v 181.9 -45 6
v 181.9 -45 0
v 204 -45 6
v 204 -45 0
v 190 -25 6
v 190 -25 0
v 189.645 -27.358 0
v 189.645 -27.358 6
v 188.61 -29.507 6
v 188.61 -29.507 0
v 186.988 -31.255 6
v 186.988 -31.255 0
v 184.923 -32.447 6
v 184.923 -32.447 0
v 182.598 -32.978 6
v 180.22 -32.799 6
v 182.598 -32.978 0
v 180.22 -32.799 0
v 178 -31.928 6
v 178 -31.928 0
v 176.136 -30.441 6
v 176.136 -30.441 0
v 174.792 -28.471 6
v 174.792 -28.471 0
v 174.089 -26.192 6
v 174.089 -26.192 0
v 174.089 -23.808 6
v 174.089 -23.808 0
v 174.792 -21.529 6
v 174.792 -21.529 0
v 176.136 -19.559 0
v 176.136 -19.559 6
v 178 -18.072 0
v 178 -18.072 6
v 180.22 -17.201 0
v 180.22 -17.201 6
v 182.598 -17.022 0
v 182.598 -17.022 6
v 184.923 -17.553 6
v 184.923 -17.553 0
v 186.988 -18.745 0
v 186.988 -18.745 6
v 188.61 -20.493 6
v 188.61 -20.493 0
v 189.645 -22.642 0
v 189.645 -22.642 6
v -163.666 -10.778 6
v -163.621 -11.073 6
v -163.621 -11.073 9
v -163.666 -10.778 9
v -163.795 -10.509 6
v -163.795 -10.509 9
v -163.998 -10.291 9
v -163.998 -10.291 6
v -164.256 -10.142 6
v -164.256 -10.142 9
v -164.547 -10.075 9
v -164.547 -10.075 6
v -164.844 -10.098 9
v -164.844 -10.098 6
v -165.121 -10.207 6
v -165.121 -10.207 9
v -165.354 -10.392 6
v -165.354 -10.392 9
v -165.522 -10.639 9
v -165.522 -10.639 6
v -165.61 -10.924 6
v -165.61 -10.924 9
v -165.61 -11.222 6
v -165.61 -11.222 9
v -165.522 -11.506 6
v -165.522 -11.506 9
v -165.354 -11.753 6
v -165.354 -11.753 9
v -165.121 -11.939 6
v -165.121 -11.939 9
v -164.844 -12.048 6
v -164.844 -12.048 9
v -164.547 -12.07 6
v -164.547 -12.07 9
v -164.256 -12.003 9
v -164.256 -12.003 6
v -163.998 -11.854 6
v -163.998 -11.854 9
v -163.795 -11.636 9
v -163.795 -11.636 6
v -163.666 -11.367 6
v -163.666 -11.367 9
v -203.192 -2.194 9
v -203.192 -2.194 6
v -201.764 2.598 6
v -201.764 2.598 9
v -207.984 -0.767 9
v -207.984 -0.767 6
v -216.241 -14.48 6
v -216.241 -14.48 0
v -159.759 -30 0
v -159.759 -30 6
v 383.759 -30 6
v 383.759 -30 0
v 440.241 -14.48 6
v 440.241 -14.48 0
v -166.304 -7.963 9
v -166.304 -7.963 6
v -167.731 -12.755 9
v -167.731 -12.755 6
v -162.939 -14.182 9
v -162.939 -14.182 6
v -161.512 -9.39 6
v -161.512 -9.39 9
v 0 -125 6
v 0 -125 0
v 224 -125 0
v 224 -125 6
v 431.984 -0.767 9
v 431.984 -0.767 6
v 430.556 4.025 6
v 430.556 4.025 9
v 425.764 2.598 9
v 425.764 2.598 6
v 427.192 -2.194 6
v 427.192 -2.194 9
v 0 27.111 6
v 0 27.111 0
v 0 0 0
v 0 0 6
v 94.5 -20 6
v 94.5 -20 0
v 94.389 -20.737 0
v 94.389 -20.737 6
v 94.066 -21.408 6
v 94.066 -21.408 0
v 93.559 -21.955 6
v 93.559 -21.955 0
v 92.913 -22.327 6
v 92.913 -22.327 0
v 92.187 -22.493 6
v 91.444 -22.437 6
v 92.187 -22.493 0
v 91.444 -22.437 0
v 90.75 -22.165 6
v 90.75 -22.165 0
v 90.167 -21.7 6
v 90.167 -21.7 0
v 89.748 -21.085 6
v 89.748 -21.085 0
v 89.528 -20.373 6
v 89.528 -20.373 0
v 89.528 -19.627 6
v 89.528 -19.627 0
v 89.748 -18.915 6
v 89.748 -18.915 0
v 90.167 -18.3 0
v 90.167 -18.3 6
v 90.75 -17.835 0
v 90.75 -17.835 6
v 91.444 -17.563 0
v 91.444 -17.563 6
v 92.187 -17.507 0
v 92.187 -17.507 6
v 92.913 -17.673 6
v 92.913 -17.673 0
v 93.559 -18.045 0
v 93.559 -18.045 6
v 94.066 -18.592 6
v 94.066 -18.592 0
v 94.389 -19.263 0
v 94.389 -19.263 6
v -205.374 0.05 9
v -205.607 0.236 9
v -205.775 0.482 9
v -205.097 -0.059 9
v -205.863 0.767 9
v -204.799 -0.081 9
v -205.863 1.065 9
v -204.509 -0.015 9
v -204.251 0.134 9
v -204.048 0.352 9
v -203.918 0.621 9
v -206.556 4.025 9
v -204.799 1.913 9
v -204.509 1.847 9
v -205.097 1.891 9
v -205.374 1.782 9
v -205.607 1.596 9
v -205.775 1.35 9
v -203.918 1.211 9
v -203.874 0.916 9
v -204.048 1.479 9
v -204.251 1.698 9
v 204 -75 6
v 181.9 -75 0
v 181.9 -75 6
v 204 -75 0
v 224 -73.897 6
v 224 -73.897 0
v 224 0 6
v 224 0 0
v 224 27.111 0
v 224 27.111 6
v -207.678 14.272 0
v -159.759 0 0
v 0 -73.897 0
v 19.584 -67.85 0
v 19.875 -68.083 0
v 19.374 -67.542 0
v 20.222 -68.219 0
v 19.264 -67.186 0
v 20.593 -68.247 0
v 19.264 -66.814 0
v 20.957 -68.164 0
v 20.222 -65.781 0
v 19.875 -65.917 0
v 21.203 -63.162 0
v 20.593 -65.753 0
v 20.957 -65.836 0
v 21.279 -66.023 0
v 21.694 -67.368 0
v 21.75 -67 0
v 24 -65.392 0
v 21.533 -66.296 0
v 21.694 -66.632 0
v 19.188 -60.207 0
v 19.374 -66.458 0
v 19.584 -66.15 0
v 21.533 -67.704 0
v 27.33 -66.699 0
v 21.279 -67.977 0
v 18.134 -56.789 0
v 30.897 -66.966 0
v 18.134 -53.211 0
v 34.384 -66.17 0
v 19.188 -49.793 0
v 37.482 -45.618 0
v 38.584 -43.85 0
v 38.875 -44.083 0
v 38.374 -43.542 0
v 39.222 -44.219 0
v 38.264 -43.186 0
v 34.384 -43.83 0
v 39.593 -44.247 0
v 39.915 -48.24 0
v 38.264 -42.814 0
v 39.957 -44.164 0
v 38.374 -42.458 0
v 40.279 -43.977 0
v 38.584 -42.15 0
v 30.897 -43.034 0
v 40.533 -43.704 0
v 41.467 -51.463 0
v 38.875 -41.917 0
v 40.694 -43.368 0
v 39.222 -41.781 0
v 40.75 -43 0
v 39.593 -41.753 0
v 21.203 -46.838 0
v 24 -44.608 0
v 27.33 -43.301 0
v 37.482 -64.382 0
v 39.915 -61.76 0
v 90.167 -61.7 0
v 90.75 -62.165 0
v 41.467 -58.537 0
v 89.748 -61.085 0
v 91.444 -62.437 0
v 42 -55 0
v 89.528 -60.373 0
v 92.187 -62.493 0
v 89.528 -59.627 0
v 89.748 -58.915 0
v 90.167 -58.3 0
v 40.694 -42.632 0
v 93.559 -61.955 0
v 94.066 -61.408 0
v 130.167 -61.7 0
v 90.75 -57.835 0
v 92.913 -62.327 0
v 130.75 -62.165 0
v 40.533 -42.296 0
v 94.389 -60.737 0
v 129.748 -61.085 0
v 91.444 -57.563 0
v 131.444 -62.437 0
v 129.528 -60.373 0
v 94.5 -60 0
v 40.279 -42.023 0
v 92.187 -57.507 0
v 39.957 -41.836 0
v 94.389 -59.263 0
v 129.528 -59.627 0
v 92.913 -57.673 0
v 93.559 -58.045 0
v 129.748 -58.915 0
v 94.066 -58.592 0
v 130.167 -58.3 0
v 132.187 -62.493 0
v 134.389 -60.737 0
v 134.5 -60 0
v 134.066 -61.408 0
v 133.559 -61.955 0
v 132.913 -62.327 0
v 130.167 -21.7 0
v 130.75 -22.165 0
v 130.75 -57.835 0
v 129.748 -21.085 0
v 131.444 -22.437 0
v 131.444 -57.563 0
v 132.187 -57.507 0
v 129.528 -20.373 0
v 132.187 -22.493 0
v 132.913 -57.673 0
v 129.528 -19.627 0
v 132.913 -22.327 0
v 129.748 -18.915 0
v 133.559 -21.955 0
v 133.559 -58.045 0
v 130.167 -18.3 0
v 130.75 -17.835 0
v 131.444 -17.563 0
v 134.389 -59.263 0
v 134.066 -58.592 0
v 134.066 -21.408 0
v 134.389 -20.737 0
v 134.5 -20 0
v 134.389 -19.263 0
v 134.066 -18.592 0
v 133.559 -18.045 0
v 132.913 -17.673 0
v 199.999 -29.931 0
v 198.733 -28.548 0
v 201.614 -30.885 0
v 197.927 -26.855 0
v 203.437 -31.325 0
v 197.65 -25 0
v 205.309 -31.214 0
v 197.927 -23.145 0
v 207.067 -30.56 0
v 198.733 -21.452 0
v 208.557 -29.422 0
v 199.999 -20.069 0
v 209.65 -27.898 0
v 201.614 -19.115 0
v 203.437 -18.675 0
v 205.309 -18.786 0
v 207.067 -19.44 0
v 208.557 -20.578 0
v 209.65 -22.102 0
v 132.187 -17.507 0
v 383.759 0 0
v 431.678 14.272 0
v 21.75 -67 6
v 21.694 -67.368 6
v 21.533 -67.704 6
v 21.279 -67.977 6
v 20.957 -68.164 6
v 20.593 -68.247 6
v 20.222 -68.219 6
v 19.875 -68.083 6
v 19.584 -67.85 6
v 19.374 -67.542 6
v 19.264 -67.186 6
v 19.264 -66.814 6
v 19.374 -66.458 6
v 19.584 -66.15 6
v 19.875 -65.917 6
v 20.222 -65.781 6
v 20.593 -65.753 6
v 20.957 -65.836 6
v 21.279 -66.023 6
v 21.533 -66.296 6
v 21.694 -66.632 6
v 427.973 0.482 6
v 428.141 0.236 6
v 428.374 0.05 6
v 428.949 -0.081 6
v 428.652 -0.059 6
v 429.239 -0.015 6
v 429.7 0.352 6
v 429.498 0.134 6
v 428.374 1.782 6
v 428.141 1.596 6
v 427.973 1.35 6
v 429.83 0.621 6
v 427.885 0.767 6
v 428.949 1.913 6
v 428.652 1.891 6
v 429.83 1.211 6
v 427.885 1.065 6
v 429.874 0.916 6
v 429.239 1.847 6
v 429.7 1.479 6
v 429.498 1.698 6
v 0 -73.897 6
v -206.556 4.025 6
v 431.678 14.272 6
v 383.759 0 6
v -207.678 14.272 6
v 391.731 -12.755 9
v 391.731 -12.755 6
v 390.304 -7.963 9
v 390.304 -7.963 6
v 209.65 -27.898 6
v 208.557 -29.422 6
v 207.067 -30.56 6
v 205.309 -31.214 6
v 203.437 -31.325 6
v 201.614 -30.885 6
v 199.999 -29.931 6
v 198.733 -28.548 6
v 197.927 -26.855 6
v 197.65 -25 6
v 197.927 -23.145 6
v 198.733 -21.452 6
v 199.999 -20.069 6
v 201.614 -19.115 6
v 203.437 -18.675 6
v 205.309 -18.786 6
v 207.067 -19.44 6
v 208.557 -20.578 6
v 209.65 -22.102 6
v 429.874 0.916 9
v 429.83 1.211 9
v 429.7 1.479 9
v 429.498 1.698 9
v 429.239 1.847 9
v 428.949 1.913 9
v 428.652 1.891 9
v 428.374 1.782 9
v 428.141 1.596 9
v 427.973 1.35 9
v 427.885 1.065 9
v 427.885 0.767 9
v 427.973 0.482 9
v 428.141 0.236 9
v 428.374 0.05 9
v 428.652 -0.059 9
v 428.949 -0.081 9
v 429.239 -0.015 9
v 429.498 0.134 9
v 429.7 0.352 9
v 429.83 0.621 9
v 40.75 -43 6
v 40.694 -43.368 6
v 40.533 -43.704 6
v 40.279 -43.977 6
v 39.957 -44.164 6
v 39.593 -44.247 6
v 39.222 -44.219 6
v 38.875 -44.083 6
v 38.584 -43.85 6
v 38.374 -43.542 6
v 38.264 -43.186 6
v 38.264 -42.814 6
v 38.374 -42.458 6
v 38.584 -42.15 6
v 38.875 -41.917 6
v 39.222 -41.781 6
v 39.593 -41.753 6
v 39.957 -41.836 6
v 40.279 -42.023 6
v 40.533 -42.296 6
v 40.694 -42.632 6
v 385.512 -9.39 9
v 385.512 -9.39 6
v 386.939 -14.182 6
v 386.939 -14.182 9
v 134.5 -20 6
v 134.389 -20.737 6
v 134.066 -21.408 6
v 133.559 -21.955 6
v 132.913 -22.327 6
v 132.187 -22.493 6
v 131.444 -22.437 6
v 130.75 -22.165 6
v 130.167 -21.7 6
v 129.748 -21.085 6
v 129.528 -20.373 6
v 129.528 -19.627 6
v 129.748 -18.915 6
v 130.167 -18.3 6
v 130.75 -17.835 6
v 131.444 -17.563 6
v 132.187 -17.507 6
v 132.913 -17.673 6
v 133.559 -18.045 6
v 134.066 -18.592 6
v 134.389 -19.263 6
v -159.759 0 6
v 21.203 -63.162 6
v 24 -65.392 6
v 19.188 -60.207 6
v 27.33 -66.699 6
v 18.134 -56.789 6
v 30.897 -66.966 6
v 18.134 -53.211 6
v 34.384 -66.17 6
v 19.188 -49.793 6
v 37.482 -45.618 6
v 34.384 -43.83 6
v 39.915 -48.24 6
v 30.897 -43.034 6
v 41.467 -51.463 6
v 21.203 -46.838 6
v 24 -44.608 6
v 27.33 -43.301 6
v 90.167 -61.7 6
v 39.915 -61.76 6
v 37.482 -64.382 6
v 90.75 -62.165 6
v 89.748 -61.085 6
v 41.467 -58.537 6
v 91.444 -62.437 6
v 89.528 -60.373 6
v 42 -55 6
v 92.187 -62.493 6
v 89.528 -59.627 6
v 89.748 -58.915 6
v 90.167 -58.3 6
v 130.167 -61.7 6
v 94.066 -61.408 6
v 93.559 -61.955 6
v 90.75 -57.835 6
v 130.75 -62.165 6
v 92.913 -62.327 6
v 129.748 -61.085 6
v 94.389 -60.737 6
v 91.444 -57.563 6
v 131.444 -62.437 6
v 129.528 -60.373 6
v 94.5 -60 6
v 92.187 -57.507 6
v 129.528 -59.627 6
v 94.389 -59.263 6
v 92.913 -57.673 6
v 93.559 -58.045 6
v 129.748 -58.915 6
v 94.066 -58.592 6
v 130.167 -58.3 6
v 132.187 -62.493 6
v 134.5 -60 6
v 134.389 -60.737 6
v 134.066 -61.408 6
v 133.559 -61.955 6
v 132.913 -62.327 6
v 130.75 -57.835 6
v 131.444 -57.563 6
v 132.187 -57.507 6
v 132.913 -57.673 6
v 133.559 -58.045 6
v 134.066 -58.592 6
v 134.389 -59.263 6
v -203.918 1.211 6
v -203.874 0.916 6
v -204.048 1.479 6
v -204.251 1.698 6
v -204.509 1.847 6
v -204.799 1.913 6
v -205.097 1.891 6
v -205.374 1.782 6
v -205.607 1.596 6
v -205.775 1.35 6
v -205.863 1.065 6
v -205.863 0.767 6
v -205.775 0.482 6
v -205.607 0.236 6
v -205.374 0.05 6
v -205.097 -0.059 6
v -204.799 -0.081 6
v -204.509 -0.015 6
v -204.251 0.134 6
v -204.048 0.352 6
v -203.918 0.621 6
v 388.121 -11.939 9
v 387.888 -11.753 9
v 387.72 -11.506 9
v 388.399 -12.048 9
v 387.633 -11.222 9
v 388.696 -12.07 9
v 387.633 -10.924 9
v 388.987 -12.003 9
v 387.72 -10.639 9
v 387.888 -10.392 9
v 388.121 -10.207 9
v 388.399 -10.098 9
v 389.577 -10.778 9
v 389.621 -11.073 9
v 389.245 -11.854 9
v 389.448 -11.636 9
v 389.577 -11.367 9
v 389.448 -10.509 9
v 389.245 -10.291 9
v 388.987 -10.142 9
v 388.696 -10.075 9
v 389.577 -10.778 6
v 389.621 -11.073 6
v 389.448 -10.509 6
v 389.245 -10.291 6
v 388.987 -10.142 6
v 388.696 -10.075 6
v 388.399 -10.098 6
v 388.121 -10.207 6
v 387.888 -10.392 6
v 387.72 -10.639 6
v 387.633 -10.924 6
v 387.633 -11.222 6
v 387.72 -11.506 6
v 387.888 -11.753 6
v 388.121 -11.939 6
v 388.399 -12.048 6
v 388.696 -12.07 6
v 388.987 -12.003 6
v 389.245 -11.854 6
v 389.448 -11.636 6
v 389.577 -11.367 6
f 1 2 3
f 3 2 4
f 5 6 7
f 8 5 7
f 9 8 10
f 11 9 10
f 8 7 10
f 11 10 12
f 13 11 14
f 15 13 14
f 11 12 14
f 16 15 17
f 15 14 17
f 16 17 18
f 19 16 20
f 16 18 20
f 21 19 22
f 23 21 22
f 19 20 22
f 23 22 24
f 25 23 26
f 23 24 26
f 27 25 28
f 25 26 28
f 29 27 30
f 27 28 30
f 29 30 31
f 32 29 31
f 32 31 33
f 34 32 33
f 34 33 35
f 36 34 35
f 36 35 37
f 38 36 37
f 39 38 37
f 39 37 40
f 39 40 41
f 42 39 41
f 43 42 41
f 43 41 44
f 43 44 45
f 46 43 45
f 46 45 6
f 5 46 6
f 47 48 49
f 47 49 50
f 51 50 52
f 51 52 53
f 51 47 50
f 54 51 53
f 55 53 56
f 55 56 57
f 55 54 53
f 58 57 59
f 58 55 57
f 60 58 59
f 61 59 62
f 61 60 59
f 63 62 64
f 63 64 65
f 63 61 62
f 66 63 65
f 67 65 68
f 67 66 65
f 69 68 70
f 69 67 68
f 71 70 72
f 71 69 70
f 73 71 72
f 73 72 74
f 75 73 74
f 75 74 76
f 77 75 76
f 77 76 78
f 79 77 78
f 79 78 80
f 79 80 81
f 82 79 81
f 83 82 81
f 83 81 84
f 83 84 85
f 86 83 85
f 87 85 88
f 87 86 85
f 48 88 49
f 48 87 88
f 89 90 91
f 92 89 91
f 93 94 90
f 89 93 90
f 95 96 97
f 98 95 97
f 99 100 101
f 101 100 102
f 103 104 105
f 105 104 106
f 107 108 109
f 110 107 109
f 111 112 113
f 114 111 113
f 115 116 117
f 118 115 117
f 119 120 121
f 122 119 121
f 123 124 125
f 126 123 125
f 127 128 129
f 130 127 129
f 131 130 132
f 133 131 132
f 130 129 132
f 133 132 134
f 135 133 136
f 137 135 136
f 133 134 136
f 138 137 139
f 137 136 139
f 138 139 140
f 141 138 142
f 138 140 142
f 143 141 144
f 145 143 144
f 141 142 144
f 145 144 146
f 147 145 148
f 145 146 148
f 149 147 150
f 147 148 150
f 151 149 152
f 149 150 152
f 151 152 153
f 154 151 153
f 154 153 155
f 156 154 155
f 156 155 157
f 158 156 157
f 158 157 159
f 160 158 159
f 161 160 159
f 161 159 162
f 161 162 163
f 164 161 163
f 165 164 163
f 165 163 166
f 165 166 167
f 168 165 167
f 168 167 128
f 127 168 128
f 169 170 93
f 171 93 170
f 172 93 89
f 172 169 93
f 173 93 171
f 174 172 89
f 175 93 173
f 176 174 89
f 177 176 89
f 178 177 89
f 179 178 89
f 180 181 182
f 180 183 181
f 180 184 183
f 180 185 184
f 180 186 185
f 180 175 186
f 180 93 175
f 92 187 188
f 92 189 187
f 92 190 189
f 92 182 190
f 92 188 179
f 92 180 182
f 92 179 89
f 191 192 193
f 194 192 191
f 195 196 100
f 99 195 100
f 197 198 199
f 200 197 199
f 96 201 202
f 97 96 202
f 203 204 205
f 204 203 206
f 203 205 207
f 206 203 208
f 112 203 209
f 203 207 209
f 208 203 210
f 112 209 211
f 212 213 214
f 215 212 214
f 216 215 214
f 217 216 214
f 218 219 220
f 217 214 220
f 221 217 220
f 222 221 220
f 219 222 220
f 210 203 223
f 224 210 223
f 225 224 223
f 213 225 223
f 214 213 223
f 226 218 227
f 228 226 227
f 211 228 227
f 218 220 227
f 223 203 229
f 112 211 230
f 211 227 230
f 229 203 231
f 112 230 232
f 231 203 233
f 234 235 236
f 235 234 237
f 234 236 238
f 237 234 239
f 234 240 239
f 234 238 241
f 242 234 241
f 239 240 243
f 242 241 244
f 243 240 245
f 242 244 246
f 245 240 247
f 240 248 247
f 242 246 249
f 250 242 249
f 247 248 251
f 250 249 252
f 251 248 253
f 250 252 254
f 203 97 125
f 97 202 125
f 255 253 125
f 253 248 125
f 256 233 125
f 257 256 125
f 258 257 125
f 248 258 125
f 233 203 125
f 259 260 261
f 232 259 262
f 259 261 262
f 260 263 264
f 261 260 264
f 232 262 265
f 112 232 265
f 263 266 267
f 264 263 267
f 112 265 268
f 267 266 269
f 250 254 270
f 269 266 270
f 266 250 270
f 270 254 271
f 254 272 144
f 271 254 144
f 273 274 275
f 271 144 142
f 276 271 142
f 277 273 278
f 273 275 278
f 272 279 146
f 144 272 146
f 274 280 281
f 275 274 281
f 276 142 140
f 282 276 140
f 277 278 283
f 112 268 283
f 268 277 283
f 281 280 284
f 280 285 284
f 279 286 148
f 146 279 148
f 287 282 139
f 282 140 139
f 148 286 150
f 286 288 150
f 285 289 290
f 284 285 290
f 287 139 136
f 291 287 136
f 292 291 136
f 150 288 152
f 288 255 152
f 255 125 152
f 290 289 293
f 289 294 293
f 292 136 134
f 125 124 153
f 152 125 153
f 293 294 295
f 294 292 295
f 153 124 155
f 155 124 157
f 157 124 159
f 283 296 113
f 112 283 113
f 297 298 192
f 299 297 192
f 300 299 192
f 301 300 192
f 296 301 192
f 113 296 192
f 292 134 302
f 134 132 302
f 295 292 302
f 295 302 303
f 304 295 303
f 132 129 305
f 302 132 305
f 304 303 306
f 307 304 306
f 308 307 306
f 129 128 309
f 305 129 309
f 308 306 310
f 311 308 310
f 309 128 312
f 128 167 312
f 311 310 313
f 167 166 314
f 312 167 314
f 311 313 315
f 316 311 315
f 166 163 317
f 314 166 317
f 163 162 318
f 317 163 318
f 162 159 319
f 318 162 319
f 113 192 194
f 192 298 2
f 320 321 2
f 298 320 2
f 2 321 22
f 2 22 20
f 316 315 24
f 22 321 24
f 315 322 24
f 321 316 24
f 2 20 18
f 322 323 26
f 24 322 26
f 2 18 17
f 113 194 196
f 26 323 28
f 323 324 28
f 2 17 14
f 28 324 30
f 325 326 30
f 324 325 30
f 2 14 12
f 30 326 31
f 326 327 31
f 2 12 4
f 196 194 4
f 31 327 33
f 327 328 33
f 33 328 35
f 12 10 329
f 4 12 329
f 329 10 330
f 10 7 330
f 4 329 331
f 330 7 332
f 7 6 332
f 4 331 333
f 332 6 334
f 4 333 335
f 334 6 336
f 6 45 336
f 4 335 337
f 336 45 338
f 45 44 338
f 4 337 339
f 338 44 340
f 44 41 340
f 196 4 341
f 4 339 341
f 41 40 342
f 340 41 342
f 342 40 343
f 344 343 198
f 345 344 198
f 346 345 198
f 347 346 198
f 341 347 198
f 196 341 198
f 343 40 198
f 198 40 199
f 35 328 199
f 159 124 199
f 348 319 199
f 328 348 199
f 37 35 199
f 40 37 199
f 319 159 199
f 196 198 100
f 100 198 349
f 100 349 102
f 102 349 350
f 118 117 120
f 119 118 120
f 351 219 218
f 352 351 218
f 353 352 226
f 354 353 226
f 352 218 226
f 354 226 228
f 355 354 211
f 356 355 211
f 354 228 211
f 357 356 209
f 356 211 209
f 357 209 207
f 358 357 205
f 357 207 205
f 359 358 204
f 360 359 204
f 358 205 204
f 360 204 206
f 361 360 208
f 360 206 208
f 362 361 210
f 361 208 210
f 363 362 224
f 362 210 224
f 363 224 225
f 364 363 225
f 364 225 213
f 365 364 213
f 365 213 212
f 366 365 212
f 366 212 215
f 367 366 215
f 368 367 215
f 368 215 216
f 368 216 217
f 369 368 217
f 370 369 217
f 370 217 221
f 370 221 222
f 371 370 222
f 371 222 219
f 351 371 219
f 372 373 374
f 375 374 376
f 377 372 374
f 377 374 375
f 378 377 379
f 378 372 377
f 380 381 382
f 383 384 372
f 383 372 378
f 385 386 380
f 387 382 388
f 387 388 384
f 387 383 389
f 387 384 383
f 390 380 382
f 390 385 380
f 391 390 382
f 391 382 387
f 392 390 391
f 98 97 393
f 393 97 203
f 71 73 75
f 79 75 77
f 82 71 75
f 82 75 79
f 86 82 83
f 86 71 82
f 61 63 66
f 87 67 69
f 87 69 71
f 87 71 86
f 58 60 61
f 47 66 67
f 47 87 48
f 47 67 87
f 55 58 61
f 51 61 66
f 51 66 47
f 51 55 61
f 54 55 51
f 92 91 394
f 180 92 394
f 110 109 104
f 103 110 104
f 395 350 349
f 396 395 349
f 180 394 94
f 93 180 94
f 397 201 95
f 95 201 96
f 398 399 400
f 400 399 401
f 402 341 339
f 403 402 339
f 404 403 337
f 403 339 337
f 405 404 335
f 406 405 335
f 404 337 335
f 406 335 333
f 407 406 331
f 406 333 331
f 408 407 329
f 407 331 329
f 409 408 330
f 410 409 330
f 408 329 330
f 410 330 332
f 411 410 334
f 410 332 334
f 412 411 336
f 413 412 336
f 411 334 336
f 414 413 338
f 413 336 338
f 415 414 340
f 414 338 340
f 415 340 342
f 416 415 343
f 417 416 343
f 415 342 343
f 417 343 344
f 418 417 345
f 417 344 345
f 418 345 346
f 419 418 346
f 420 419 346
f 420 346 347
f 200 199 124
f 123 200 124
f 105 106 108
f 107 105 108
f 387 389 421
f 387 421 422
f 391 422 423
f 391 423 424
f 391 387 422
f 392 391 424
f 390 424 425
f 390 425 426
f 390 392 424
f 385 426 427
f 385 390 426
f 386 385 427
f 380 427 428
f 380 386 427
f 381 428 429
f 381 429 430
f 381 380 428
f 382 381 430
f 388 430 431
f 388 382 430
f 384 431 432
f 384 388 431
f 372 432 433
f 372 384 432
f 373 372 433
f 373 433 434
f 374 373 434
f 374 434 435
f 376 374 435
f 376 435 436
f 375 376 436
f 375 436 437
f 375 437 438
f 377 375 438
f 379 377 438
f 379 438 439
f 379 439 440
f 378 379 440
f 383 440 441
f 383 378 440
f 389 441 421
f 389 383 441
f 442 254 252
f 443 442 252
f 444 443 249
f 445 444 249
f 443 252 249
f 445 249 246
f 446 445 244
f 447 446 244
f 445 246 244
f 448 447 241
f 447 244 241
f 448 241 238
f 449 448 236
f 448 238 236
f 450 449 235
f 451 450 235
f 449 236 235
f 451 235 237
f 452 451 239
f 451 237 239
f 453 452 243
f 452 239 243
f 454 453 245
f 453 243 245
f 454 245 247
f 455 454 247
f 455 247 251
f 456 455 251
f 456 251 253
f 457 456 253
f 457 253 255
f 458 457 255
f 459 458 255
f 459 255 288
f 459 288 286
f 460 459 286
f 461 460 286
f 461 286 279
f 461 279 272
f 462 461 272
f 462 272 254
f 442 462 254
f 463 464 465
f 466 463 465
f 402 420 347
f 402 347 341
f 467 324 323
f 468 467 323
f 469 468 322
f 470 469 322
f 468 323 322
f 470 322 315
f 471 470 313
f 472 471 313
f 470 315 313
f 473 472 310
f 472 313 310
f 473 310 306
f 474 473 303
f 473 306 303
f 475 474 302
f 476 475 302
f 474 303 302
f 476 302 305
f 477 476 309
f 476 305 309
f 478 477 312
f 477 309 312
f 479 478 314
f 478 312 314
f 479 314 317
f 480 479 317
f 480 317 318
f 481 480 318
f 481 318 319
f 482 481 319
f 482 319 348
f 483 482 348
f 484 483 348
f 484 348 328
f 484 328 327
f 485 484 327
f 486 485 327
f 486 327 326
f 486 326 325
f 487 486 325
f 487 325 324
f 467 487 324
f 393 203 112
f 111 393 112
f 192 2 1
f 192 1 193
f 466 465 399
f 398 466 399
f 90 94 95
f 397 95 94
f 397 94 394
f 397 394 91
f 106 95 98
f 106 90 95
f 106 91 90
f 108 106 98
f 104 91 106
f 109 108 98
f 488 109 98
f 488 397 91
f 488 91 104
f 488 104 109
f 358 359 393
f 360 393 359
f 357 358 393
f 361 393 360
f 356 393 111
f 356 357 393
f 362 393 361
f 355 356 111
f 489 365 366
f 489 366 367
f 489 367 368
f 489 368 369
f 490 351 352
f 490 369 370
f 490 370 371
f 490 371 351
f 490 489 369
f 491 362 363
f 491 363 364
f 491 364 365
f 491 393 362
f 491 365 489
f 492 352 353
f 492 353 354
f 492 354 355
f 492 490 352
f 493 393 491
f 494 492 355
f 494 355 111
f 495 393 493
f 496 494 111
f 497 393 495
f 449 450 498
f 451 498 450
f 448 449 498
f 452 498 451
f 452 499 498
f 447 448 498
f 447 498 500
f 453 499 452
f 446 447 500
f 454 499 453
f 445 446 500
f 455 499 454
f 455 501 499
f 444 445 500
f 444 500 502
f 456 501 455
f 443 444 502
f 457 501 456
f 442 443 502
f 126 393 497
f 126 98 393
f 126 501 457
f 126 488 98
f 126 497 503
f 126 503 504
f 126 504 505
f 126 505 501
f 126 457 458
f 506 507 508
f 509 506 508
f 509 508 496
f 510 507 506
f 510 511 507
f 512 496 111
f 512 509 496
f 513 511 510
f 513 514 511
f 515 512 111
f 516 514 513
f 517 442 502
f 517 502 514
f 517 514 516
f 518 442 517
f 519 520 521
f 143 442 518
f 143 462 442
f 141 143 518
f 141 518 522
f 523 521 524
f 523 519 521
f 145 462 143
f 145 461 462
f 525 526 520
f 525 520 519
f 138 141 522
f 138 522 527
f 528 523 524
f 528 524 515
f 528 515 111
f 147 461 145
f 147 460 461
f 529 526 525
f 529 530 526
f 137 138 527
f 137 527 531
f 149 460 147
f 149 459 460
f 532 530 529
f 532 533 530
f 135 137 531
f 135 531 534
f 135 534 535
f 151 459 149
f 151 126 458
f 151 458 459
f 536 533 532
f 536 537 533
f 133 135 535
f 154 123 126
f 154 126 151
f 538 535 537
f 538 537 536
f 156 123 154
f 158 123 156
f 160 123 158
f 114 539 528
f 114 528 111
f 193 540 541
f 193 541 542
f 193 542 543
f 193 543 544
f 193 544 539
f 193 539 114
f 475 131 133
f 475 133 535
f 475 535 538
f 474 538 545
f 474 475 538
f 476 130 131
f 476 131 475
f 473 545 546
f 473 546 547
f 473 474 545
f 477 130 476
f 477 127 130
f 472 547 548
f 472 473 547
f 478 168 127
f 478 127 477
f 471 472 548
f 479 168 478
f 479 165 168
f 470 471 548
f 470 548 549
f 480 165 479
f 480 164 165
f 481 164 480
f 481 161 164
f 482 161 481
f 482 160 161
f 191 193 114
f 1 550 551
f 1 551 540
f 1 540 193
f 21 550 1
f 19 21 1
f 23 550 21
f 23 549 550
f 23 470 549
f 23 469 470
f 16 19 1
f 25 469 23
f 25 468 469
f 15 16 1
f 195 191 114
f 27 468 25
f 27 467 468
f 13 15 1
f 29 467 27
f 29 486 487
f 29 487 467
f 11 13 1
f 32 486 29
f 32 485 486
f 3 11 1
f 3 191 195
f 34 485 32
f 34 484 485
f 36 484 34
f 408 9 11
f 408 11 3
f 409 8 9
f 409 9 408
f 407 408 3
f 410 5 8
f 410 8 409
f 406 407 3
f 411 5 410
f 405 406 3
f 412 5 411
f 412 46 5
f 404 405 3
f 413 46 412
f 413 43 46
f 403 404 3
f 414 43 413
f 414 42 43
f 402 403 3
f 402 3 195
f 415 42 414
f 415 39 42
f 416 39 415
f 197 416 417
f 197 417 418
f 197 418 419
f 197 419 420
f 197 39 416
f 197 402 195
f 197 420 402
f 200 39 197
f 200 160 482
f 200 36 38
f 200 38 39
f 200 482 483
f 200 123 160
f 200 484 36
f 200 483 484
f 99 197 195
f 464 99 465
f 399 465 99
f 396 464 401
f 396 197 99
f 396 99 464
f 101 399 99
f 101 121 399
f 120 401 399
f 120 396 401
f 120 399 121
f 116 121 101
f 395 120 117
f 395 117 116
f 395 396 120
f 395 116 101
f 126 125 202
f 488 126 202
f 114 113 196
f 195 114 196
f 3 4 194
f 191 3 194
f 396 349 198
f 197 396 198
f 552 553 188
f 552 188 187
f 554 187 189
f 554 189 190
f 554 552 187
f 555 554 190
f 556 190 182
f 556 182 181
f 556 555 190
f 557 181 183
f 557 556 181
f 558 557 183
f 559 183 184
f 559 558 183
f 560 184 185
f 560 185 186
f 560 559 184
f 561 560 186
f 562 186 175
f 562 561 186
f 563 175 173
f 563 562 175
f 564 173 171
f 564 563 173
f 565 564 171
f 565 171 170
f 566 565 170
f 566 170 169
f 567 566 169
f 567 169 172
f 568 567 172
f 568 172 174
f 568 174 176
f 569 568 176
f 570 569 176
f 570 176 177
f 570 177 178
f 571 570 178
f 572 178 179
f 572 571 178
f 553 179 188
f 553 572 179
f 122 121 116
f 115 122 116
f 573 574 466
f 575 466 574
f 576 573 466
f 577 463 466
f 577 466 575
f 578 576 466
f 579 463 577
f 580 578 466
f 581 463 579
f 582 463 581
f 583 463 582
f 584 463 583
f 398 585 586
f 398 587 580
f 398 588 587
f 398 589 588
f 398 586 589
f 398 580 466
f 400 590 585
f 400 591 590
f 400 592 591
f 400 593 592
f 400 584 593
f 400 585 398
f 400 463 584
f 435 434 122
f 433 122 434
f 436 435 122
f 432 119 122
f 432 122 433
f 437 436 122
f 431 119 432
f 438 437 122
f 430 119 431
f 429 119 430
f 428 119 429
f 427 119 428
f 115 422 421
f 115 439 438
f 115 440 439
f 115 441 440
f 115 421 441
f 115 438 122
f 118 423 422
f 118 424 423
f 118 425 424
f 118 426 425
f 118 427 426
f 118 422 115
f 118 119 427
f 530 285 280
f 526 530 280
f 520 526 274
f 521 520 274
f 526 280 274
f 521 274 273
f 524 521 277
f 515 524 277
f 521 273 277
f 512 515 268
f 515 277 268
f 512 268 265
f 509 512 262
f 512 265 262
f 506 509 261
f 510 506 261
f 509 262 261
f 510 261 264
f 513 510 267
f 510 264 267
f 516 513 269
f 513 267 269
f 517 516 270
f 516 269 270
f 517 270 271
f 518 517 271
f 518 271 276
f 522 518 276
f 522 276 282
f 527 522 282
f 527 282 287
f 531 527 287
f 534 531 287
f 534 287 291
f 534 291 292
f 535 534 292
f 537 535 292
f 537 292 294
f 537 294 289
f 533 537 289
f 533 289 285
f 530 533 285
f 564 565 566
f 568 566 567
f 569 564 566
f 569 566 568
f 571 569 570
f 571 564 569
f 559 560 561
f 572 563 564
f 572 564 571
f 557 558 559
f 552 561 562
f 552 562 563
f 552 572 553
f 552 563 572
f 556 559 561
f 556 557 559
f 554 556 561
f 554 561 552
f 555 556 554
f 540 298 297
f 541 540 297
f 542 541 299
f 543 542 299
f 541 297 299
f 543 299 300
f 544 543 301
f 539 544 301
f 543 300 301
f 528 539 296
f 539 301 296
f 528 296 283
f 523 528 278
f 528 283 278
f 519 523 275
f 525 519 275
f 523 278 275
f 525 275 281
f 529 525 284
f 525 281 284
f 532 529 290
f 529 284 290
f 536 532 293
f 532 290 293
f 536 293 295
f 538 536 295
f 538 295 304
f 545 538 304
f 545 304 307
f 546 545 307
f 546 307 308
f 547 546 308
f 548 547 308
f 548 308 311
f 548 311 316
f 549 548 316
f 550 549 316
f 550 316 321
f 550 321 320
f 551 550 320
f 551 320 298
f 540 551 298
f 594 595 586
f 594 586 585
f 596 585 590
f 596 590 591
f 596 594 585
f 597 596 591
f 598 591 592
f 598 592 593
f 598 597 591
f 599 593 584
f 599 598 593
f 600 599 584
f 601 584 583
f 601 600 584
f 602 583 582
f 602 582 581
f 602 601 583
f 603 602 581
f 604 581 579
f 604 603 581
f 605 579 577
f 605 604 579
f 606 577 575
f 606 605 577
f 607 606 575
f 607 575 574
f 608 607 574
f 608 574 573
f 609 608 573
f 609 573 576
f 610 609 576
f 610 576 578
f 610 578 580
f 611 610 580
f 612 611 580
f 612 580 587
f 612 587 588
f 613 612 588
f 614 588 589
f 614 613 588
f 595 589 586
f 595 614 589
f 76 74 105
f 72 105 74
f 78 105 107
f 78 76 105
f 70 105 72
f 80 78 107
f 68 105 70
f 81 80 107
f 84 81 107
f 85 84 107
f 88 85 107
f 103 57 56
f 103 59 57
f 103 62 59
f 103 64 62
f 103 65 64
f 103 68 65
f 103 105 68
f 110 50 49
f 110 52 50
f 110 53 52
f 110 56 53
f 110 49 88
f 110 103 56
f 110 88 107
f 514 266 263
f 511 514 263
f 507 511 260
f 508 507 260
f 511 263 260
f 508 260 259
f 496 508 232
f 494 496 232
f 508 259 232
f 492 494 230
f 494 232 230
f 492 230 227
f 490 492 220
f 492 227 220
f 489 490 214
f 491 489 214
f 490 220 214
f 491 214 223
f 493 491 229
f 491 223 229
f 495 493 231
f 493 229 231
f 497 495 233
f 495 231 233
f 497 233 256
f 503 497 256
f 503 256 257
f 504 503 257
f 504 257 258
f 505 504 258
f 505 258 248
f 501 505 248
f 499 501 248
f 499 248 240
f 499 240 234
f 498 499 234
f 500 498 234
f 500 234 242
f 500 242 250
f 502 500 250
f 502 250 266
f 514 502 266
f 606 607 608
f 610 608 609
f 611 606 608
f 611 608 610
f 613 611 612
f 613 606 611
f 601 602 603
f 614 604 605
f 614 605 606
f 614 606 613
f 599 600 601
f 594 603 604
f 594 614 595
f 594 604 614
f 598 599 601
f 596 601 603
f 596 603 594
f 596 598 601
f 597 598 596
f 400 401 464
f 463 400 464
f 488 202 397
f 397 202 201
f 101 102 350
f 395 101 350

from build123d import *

# Parameters (mm, degrees)
F1_DEPTH  = 6
F3_R      = 2.5
F4_DEPTH  = 25
F5_W      = 22.1
F5_H      = 30
F6_DEPTH  = 25
F7_R      = 8
F7_R_2    = 12
F7_R_3    = 1.25
F8_DEPTH  = 25
F9_R      = 1
F10_DEPTH = 3
F11_R     = 1
F12_DEPTH = 3


with BuildPart() as f1:
    # F0 (on Top) → F1 (new body)
    with BuildSketch(Plane.XY):
        Polygon((0, -73.897189), (0, -125), (224, -125), (224, -73.897189), (383.758505, -30), (440.241495, -14.480047), (431.678371, 14.271873), (383.758505, 0), (224, 0), (224, 27.111), (0, 27.111), (0, 0), (-159.758505, 0), (-207.678371, 14.271873), (-216.241495, -14.480047), (-159.758505, -30), align=None)
    extrude(amount=F1_DEPTH)

    # F3 (on face) → F4 (cut)
    with BuildSketch(Plane(origin=(0, 0, 0), x_dir=(1, 0, 0), z_dir=(0, 0, -1))):
        with Locations((132, 60)):
            Circle(F3_R)
        with Locations((132, 20)):
            Circle(F3_R)
        with Locations((92, 60)):
            Circle(F3_R)
        with Locations((92, 20)):
            Circle(F3_R)
    extrude(amount=-F4_DEPTH, mode=Mode.SUBTRACT)

    # F5 (on face) → F6 (cut)
    with BuildSketch(Plane(origin=(0, 0, 0), x_dir=(1, 0, 0), z_dir=(0, 0, -1))):
        with Locations((192.95, 60)):
            Rectangle(F5_W, F5_H)
    extrude(amount=-F6_DEPTH, mode=Mode.SUBTRACT)

    # F7 (on face) → F8 (cut)
    with BuildSketch(Plane(origin=(0, 0, 0), x_dir=(1, 0, 0), z_dir=(0, 0, -1))):
        with BuildLine():
            Line((209.65, 22.101725), (209.65, 27.898275))
            ThreePointArc((209.65, 27.898275), (197.65, 25), (209.65, 22.101725))
        make_face()
        with Locations((182, 25)):
            Circle(F7_R)
        with Locations((30, 55)):
            Circle(F7_R_2)
        with Locations((20.5, 67)):
            Circle(F7_R_3)
        with Locations((39.5, 43)):
            Circle(F7_R_3)
    extrude(amount=-F8_DEPTH, mode=Mode.SUBTRACT)

    # F9 (on face) → F10 (join)
    with BuildSketch(Plane.XY.offset(6)):
        Polygon((430.556438, 4.025349), (425.764451, 2.598162), (427.191639, -2.193825), (431.983625, -0.766638), align=None)
        with Locations((428.874038, 0.915762)):
            Circle(F9_R, mode=Mode.SUBTRACT)
        Polygon((390.30375, -7.963025), (385.511763, -9.390212), (386.938951, -14.182199), (391.730937, -12.755011), align=None)
        with Locations((388.62135, -11.072612)):
            Circle(F9_R, mode=Mode.SUBTRACT)
    extrude(amount=F10_DEPTH)

    # F11 (on face) → F12 (join)
    with BuildSketch(Plane.XY.offset(6)):
        Polygon((-203.191639, -2.193825), (-201.764451, 2.598162), (-206.556438, 4.025349), (-207.983625, -0.766638), align=None)
        with Locations((-204.874038, 0.915762)):
            Circle(F11_R, mode=Mode.SUBTRACT)
        Polygon((-162.938951, -14.182199), (-161.511763, -9.390212), (-166.30375, -7.963025), (-167.730937, -12.755011), align=None)
        with Locations((-164.62135, -11.072612)):
            Circle(F11_R, mode=Mode.SUBTRACT)
    extrude(amount=F12_DEPTH)


solid = f1.part
